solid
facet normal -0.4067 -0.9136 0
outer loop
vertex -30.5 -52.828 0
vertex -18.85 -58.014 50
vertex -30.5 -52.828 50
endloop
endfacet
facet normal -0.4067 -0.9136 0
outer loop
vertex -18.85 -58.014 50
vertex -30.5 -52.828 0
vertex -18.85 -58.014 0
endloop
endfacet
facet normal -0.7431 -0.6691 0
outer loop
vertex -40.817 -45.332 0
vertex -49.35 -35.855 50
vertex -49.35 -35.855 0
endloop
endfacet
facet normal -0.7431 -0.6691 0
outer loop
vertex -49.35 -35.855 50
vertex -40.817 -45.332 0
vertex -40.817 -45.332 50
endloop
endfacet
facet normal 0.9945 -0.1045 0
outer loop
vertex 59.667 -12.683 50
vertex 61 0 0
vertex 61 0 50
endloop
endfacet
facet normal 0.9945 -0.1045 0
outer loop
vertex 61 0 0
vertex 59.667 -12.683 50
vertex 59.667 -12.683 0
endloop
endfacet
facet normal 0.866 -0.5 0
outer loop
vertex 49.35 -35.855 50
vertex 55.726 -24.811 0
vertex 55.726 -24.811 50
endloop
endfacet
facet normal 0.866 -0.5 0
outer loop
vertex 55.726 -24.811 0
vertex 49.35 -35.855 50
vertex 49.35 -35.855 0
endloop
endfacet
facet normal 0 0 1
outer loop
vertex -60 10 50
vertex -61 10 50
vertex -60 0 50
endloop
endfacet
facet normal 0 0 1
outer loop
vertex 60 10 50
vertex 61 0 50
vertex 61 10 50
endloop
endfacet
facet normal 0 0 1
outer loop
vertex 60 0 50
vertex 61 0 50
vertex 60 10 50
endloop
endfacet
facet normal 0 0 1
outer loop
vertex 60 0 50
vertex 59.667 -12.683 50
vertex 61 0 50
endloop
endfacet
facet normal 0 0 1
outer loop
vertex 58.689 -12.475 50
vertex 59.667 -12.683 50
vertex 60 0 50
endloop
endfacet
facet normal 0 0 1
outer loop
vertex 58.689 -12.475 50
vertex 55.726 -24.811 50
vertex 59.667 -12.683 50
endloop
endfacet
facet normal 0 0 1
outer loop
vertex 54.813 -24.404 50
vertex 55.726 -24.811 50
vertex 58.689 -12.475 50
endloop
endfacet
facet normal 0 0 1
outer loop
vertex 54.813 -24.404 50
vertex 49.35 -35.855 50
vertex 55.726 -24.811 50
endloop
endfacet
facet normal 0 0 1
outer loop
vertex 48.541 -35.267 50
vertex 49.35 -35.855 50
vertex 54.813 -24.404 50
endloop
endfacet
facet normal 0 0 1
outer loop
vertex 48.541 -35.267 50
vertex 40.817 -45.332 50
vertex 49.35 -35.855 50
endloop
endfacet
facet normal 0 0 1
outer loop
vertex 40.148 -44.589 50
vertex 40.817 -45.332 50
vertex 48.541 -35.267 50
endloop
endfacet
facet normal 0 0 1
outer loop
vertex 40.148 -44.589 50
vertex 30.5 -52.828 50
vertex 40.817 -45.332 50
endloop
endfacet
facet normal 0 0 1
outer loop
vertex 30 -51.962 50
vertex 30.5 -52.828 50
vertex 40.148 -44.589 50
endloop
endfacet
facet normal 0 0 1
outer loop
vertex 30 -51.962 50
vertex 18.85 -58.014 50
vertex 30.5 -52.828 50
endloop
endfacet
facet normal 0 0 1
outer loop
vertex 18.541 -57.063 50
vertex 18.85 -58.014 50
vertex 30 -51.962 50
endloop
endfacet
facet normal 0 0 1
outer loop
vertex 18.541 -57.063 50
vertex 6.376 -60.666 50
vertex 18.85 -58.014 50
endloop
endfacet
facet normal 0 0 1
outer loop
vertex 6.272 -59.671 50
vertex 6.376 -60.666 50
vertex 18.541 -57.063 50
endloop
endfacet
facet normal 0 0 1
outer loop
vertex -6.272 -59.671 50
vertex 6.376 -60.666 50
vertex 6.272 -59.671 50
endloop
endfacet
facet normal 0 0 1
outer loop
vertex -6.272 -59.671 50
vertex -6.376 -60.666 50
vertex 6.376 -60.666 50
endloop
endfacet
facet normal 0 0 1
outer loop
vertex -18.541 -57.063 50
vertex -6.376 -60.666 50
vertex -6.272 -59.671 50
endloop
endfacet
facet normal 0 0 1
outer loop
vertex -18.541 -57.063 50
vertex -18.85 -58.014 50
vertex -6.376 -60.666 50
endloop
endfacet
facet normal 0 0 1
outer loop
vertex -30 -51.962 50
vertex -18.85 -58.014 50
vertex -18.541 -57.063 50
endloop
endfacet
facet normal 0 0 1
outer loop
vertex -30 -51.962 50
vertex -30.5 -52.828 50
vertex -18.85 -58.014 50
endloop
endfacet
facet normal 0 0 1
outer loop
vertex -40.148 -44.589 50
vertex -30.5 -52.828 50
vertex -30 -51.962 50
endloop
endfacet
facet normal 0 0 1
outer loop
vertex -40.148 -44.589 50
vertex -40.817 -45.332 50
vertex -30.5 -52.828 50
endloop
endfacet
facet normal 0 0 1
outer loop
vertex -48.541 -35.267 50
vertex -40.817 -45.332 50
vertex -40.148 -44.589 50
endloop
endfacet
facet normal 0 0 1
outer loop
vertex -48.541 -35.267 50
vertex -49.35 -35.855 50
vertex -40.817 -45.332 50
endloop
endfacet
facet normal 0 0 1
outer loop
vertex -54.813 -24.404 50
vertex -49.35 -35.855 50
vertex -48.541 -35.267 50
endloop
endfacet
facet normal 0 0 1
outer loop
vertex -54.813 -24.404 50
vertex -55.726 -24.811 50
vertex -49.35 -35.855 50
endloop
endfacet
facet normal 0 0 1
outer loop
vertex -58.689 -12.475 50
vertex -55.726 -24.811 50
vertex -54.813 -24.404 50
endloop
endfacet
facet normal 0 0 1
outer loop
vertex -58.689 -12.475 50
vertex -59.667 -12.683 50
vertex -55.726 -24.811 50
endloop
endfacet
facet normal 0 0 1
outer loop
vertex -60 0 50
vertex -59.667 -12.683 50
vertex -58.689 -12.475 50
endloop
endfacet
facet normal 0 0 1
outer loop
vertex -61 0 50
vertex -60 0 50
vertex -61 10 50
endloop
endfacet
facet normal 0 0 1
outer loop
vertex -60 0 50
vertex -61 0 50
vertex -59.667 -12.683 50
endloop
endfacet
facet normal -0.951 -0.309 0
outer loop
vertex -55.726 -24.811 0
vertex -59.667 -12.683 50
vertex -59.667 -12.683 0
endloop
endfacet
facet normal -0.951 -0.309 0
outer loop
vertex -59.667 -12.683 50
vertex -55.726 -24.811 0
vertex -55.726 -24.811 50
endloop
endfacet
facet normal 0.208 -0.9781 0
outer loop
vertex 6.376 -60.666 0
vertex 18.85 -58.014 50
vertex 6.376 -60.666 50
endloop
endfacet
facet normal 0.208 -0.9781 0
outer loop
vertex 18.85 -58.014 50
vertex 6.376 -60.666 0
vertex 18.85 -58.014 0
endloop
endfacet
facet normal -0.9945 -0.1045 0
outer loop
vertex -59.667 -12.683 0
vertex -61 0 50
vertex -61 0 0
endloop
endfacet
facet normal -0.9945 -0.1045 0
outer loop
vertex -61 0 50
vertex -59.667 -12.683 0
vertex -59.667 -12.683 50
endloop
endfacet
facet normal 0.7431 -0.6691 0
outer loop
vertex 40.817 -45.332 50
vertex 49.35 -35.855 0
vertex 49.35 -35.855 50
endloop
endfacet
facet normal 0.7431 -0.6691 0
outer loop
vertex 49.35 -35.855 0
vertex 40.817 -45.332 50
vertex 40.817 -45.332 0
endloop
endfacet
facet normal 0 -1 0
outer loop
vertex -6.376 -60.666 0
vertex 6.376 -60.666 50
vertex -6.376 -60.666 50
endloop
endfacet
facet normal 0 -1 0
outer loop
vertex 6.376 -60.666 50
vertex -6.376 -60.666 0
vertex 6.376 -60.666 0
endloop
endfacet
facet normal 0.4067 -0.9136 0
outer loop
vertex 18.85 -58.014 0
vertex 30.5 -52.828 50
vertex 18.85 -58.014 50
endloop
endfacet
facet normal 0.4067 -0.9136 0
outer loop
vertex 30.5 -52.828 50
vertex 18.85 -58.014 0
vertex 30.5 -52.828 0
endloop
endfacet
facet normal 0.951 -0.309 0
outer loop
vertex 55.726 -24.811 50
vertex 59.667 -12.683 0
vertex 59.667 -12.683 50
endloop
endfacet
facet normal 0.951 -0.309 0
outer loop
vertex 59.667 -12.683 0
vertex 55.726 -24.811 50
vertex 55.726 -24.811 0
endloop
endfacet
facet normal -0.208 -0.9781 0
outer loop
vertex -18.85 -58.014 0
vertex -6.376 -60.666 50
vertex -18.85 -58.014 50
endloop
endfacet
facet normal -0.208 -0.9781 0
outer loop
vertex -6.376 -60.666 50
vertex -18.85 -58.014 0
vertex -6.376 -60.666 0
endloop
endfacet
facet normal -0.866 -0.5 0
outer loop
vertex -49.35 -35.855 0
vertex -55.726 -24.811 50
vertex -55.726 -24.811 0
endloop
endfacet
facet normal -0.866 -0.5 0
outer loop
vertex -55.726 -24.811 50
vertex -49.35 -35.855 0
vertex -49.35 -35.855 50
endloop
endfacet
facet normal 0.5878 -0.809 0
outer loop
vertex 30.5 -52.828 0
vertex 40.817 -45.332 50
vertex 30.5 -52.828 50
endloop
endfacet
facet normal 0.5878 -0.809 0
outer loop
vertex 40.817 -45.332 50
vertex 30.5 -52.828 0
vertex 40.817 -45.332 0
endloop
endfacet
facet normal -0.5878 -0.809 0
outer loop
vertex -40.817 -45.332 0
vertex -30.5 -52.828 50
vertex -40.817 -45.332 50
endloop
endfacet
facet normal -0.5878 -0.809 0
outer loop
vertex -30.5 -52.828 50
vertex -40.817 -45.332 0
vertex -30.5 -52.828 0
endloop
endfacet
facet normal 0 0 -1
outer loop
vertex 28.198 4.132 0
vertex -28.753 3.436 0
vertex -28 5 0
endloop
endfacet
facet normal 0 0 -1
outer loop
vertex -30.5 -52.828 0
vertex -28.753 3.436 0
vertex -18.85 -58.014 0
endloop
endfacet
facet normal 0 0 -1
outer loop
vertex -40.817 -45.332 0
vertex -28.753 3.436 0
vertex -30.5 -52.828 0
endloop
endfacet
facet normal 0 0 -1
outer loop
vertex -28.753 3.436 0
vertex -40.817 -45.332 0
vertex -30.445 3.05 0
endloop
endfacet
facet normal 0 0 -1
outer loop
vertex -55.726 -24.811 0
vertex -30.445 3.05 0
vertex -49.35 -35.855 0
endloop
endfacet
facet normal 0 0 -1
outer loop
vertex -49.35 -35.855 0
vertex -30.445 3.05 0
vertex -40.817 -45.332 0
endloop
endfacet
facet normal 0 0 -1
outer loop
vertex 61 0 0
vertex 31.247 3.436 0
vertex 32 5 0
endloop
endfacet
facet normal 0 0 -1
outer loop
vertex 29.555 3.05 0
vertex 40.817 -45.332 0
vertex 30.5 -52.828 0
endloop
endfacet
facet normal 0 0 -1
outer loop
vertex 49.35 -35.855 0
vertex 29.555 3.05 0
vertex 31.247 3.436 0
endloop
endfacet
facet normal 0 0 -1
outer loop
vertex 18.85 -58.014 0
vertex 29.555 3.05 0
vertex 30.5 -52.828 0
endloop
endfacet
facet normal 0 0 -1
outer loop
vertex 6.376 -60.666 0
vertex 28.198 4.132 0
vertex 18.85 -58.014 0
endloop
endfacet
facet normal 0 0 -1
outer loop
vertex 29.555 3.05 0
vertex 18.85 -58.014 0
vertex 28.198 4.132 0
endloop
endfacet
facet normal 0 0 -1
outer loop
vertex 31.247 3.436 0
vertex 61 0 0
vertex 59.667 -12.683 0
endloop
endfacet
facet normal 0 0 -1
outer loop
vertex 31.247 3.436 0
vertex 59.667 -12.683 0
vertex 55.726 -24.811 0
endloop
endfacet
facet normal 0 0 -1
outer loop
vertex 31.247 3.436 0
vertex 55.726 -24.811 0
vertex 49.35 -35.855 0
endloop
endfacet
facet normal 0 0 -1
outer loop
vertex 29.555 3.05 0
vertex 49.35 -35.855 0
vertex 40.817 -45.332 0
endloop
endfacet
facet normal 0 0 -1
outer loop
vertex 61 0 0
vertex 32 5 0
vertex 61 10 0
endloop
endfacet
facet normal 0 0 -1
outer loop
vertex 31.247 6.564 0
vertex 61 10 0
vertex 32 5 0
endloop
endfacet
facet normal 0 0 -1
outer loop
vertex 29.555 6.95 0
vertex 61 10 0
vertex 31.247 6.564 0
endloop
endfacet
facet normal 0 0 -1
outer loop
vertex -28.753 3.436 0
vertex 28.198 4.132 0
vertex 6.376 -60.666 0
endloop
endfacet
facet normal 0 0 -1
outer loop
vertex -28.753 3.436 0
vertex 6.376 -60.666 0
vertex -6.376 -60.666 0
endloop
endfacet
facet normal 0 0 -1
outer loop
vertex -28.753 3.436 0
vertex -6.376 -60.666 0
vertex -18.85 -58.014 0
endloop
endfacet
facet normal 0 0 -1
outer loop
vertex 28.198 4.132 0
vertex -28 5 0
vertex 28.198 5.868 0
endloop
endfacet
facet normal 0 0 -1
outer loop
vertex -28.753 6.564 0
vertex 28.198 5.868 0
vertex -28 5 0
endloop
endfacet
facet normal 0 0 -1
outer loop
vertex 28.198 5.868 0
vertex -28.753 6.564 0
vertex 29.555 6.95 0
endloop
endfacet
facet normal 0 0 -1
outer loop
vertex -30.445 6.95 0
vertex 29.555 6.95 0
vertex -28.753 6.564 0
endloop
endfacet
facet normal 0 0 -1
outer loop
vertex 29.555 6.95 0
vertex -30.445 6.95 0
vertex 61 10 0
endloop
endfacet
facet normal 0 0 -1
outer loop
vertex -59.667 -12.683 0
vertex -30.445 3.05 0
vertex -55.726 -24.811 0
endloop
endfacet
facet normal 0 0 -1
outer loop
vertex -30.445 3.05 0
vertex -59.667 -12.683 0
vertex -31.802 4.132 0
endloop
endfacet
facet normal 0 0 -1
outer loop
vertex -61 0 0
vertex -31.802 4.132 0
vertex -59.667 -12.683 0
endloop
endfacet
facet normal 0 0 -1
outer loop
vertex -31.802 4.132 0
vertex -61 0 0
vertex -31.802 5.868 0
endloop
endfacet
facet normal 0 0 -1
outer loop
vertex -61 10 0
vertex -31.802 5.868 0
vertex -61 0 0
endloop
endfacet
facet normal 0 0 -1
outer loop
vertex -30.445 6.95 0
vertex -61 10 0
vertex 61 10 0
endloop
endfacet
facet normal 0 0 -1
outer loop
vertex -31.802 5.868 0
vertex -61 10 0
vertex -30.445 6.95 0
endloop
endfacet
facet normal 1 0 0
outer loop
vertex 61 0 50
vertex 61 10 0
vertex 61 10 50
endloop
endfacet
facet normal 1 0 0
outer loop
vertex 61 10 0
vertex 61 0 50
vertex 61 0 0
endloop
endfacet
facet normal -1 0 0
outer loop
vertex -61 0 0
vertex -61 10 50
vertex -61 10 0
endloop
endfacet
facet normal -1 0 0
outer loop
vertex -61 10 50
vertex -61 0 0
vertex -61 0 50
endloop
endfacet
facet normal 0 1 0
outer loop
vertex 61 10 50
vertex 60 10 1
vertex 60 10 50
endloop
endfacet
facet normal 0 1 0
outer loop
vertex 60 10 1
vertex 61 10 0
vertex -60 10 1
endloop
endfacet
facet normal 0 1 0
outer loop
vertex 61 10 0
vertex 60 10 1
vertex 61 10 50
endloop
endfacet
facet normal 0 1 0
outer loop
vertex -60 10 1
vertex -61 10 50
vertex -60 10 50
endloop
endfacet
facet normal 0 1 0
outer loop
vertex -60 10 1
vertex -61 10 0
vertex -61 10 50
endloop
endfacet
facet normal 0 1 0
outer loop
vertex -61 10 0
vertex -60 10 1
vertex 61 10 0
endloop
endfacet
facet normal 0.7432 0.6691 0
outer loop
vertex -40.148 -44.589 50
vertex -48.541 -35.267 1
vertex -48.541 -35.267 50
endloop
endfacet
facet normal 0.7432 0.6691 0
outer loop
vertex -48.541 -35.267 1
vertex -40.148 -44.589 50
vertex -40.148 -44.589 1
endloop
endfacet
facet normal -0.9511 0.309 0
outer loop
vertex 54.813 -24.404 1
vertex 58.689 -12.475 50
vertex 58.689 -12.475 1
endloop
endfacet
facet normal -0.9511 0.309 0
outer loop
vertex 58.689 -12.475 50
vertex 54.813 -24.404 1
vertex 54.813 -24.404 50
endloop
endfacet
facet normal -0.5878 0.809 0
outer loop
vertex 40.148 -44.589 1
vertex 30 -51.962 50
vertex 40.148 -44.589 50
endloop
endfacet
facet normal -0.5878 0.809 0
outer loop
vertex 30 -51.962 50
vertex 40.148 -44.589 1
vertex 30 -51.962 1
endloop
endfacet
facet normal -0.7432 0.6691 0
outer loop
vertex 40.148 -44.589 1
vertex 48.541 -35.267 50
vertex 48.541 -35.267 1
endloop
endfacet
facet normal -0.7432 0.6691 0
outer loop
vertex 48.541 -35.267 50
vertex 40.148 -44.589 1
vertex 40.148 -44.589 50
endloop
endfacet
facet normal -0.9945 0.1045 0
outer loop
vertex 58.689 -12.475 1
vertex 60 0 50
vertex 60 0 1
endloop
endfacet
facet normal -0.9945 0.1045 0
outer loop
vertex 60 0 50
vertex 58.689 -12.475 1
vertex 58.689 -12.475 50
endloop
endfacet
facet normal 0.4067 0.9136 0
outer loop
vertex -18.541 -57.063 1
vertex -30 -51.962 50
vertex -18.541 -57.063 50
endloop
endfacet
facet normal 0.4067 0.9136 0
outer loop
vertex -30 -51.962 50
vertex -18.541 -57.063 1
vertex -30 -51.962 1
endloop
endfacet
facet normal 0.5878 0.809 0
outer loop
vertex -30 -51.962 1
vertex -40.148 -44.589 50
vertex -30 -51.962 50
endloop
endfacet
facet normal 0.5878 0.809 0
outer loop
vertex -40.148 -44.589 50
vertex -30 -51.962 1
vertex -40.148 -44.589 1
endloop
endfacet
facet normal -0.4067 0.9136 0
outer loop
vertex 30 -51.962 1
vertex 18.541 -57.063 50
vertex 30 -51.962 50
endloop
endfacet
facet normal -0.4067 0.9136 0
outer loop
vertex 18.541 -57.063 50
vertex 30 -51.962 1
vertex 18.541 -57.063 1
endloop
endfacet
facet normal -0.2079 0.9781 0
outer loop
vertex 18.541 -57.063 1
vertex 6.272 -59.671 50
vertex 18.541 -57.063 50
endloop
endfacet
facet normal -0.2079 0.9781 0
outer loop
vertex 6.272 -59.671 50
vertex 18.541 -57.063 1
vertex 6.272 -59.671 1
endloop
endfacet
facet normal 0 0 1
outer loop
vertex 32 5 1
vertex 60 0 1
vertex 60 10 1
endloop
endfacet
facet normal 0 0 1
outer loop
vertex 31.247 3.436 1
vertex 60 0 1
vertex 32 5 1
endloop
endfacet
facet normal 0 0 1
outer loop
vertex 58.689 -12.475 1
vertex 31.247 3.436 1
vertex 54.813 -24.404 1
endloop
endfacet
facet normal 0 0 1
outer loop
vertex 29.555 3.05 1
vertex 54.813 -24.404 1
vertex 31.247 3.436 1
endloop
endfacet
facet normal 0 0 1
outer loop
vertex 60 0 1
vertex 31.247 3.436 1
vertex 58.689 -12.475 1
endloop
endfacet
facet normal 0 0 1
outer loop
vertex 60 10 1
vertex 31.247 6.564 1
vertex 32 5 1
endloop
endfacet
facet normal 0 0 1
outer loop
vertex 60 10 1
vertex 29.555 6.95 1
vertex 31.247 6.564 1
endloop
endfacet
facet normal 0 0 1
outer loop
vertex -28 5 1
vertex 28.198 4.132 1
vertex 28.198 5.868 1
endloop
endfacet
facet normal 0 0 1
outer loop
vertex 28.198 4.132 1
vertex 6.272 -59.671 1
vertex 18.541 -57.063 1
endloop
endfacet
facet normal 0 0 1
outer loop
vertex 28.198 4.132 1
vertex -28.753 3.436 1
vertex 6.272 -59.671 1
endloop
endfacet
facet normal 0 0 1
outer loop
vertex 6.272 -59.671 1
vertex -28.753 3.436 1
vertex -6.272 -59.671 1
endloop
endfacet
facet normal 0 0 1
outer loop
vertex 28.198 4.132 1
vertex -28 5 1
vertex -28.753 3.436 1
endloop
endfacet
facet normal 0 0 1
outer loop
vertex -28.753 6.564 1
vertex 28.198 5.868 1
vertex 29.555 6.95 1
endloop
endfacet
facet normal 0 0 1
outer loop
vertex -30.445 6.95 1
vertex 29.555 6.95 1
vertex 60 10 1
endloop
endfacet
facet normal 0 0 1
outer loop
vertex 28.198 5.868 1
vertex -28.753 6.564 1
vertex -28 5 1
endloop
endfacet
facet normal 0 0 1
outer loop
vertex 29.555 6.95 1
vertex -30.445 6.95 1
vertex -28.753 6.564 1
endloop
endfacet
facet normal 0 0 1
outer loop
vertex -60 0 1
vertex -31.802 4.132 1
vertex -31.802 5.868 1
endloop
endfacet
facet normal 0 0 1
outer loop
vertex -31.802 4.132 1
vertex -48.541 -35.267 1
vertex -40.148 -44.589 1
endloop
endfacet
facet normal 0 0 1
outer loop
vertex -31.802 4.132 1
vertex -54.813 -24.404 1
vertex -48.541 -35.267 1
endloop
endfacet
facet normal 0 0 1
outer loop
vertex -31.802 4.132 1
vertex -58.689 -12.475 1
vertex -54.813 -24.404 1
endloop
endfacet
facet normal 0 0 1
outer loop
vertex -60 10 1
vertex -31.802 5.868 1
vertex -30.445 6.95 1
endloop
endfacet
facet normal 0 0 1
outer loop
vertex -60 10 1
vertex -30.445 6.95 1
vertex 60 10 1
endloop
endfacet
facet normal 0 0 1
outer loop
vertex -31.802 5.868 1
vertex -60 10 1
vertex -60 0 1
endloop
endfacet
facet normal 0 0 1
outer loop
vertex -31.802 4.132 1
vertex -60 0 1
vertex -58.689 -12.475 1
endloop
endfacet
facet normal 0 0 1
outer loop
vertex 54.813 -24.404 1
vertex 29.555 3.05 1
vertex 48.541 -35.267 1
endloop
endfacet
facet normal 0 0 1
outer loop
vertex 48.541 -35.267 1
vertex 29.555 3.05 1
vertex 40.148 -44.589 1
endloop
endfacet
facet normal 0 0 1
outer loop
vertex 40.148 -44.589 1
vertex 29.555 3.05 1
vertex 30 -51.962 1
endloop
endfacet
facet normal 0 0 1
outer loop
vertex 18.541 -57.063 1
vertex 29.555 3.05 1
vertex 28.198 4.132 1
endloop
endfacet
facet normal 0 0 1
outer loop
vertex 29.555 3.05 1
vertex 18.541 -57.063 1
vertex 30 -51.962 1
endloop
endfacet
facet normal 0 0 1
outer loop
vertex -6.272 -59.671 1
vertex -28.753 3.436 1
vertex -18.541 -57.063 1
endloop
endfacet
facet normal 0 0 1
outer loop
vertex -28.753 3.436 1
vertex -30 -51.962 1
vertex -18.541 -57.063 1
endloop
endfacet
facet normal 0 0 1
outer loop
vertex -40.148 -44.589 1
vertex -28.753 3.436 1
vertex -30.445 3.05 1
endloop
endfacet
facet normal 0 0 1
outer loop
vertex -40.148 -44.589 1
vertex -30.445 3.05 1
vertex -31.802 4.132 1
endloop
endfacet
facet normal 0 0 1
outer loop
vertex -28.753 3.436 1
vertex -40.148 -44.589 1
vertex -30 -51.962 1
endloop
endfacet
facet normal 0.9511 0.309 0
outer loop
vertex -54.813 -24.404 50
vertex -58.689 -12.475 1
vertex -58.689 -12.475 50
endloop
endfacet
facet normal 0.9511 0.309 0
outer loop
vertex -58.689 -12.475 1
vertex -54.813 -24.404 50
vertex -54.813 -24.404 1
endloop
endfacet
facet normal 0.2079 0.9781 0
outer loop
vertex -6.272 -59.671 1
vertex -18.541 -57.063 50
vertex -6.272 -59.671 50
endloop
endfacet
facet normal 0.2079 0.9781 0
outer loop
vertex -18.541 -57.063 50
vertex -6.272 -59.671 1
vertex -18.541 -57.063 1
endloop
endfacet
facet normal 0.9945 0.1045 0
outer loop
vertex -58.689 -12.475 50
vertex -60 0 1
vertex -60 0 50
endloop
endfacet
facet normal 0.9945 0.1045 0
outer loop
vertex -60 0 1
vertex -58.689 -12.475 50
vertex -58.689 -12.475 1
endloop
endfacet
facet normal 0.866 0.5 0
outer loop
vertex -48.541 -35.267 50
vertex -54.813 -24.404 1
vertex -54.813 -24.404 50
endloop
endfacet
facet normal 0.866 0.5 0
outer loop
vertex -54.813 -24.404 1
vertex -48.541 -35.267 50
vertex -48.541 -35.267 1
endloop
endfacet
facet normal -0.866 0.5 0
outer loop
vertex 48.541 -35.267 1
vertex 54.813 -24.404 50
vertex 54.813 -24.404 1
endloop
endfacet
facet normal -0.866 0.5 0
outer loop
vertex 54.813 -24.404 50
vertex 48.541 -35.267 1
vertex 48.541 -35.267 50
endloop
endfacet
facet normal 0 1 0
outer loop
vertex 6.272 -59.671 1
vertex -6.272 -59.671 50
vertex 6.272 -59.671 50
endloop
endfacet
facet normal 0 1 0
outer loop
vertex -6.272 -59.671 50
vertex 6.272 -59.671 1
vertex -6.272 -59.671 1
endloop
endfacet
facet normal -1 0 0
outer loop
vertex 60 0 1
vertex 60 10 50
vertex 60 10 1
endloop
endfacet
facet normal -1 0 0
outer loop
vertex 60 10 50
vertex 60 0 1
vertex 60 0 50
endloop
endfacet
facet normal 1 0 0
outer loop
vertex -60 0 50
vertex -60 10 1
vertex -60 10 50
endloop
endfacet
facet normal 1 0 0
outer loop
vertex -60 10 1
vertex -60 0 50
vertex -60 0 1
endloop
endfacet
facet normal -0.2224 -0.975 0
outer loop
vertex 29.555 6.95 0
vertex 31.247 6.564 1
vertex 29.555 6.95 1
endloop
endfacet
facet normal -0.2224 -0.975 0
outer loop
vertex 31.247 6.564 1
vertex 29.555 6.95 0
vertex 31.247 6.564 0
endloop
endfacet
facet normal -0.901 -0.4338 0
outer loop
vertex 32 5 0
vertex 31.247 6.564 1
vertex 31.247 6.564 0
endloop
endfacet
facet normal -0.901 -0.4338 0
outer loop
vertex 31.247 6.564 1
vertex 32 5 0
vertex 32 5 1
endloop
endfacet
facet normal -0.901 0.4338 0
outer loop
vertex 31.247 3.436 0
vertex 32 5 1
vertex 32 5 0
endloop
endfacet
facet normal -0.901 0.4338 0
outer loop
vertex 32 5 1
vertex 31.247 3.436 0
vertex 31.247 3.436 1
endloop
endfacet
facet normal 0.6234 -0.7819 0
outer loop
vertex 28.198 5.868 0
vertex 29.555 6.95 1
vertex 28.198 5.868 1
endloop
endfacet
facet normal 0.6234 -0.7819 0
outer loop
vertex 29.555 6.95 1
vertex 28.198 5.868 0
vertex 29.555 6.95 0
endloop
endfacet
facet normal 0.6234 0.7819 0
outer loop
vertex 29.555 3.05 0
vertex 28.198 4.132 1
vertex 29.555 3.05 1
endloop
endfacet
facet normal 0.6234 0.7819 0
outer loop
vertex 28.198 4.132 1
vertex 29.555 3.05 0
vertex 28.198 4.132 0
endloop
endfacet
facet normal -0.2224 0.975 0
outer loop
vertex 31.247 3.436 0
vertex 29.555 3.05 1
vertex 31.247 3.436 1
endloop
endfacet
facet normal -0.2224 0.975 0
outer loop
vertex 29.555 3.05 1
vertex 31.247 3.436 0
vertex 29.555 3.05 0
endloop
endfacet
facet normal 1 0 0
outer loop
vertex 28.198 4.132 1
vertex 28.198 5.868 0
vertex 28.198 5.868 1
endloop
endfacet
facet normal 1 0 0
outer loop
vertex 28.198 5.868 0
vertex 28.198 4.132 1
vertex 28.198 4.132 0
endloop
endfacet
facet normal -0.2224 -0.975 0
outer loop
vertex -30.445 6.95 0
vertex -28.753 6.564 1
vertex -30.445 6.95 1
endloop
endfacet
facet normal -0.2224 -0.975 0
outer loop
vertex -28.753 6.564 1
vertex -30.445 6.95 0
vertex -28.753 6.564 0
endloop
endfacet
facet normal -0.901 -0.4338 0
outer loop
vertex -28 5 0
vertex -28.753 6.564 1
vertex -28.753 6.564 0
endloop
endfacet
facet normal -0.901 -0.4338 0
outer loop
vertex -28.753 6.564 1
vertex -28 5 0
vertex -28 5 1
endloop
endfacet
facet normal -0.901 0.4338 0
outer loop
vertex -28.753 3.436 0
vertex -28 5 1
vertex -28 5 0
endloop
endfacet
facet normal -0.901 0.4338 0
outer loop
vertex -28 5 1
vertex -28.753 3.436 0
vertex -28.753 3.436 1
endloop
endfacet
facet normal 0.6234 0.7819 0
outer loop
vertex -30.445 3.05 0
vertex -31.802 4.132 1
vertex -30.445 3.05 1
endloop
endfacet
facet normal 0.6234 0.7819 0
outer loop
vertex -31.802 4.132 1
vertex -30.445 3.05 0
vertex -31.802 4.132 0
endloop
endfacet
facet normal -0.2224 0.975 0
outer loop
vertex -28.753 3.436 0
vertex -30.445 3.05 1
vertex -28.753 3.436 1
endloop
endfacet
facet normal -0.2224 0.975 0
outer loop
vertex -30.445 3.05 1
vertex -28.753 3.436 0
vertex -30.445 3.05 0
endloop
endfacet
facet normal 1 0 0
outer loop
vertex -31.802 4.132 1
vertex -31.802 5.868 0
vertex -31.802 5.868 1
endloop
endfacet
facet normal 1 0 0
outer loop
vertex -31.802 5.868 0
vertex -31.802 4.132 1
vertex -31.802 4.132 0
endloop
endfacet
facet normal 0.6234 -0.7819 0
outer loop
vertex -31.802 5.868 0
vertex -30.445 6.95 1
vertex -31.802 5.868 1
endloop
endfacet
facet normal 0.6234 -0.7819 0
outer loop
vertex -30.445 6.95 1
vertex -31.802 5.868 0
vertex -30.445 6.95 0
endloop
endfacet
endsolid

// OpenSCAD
GUT_WIDTH = 122;
GUT_HEIGHT = 50;
WALL_THICKNESS = 1;
GUT_LIP = 10;
HOLE_R = 2;

difference(){
    union(){
        difference(){
            cylinder(h = GUT_HEIGHT, r = GUT_WIDTH / 2, center=false);
            translate([-(GUT_WIDTH / 2),0,-1]) {
                cube([GUT_WIDTH, GUT_WIDTH / 2, GUT_WIDTH + 4]);
            }
        }

        translate([-(GUT_WIDTH / 2),0,0]) {
            cube([GUT_WIDTH, GUT_LIP, GUT_HEIGHT]);
            }
        }
    
    union(){
        translate([0,0,WALL_THICKNESS]){
            cylinder(h = GUT_HEIGHT+10 - (WALL_THICKNESS *2), r = GUT_WIDTH / 2 - WALL_THICKNESS, center=false);
        }

    translate([-((GUT_WIDTH /2) - WALL_THICKNESS),0, WALL_THICKNESS]) {
        cube([GUT_WIDTH - (WALL_THICKNESS *2),(GUT_WIDTH + WALL_THICKNESS) / 2,GUT_HEIGHT -  (WALL_THICKNESS *2) + 10]);
        }
    }
    //create screw holes
    screw();
}

//screw holes
module screw(){

//translate([GUT_WIDTH / 2 - 20,GUT_WIDTH / 2 - 6,GUT_HEIGHT - 2]){
//    cylinder(h = 3, r = 1.5,center=false);
//}
//translate([-(GUT_WIDTH / 2 - 20),(GUT_WIDTH / 2 - 6),GUT_HEIGHT - 2]){
//    cylinder(h = 3, r = 1.5,center=false);
//}
translate([30,(GUT_LIP - 5),-1]){
    cylinder(h = WALL_THICKNESS + 2, r = HOLE_R,center=false);
}
translate([-30,(GUT_LIP - 5),-1]){
    cylinder(h = WALL_THICKNESS + 2, r = HOLE_R,center=false);
}
}
